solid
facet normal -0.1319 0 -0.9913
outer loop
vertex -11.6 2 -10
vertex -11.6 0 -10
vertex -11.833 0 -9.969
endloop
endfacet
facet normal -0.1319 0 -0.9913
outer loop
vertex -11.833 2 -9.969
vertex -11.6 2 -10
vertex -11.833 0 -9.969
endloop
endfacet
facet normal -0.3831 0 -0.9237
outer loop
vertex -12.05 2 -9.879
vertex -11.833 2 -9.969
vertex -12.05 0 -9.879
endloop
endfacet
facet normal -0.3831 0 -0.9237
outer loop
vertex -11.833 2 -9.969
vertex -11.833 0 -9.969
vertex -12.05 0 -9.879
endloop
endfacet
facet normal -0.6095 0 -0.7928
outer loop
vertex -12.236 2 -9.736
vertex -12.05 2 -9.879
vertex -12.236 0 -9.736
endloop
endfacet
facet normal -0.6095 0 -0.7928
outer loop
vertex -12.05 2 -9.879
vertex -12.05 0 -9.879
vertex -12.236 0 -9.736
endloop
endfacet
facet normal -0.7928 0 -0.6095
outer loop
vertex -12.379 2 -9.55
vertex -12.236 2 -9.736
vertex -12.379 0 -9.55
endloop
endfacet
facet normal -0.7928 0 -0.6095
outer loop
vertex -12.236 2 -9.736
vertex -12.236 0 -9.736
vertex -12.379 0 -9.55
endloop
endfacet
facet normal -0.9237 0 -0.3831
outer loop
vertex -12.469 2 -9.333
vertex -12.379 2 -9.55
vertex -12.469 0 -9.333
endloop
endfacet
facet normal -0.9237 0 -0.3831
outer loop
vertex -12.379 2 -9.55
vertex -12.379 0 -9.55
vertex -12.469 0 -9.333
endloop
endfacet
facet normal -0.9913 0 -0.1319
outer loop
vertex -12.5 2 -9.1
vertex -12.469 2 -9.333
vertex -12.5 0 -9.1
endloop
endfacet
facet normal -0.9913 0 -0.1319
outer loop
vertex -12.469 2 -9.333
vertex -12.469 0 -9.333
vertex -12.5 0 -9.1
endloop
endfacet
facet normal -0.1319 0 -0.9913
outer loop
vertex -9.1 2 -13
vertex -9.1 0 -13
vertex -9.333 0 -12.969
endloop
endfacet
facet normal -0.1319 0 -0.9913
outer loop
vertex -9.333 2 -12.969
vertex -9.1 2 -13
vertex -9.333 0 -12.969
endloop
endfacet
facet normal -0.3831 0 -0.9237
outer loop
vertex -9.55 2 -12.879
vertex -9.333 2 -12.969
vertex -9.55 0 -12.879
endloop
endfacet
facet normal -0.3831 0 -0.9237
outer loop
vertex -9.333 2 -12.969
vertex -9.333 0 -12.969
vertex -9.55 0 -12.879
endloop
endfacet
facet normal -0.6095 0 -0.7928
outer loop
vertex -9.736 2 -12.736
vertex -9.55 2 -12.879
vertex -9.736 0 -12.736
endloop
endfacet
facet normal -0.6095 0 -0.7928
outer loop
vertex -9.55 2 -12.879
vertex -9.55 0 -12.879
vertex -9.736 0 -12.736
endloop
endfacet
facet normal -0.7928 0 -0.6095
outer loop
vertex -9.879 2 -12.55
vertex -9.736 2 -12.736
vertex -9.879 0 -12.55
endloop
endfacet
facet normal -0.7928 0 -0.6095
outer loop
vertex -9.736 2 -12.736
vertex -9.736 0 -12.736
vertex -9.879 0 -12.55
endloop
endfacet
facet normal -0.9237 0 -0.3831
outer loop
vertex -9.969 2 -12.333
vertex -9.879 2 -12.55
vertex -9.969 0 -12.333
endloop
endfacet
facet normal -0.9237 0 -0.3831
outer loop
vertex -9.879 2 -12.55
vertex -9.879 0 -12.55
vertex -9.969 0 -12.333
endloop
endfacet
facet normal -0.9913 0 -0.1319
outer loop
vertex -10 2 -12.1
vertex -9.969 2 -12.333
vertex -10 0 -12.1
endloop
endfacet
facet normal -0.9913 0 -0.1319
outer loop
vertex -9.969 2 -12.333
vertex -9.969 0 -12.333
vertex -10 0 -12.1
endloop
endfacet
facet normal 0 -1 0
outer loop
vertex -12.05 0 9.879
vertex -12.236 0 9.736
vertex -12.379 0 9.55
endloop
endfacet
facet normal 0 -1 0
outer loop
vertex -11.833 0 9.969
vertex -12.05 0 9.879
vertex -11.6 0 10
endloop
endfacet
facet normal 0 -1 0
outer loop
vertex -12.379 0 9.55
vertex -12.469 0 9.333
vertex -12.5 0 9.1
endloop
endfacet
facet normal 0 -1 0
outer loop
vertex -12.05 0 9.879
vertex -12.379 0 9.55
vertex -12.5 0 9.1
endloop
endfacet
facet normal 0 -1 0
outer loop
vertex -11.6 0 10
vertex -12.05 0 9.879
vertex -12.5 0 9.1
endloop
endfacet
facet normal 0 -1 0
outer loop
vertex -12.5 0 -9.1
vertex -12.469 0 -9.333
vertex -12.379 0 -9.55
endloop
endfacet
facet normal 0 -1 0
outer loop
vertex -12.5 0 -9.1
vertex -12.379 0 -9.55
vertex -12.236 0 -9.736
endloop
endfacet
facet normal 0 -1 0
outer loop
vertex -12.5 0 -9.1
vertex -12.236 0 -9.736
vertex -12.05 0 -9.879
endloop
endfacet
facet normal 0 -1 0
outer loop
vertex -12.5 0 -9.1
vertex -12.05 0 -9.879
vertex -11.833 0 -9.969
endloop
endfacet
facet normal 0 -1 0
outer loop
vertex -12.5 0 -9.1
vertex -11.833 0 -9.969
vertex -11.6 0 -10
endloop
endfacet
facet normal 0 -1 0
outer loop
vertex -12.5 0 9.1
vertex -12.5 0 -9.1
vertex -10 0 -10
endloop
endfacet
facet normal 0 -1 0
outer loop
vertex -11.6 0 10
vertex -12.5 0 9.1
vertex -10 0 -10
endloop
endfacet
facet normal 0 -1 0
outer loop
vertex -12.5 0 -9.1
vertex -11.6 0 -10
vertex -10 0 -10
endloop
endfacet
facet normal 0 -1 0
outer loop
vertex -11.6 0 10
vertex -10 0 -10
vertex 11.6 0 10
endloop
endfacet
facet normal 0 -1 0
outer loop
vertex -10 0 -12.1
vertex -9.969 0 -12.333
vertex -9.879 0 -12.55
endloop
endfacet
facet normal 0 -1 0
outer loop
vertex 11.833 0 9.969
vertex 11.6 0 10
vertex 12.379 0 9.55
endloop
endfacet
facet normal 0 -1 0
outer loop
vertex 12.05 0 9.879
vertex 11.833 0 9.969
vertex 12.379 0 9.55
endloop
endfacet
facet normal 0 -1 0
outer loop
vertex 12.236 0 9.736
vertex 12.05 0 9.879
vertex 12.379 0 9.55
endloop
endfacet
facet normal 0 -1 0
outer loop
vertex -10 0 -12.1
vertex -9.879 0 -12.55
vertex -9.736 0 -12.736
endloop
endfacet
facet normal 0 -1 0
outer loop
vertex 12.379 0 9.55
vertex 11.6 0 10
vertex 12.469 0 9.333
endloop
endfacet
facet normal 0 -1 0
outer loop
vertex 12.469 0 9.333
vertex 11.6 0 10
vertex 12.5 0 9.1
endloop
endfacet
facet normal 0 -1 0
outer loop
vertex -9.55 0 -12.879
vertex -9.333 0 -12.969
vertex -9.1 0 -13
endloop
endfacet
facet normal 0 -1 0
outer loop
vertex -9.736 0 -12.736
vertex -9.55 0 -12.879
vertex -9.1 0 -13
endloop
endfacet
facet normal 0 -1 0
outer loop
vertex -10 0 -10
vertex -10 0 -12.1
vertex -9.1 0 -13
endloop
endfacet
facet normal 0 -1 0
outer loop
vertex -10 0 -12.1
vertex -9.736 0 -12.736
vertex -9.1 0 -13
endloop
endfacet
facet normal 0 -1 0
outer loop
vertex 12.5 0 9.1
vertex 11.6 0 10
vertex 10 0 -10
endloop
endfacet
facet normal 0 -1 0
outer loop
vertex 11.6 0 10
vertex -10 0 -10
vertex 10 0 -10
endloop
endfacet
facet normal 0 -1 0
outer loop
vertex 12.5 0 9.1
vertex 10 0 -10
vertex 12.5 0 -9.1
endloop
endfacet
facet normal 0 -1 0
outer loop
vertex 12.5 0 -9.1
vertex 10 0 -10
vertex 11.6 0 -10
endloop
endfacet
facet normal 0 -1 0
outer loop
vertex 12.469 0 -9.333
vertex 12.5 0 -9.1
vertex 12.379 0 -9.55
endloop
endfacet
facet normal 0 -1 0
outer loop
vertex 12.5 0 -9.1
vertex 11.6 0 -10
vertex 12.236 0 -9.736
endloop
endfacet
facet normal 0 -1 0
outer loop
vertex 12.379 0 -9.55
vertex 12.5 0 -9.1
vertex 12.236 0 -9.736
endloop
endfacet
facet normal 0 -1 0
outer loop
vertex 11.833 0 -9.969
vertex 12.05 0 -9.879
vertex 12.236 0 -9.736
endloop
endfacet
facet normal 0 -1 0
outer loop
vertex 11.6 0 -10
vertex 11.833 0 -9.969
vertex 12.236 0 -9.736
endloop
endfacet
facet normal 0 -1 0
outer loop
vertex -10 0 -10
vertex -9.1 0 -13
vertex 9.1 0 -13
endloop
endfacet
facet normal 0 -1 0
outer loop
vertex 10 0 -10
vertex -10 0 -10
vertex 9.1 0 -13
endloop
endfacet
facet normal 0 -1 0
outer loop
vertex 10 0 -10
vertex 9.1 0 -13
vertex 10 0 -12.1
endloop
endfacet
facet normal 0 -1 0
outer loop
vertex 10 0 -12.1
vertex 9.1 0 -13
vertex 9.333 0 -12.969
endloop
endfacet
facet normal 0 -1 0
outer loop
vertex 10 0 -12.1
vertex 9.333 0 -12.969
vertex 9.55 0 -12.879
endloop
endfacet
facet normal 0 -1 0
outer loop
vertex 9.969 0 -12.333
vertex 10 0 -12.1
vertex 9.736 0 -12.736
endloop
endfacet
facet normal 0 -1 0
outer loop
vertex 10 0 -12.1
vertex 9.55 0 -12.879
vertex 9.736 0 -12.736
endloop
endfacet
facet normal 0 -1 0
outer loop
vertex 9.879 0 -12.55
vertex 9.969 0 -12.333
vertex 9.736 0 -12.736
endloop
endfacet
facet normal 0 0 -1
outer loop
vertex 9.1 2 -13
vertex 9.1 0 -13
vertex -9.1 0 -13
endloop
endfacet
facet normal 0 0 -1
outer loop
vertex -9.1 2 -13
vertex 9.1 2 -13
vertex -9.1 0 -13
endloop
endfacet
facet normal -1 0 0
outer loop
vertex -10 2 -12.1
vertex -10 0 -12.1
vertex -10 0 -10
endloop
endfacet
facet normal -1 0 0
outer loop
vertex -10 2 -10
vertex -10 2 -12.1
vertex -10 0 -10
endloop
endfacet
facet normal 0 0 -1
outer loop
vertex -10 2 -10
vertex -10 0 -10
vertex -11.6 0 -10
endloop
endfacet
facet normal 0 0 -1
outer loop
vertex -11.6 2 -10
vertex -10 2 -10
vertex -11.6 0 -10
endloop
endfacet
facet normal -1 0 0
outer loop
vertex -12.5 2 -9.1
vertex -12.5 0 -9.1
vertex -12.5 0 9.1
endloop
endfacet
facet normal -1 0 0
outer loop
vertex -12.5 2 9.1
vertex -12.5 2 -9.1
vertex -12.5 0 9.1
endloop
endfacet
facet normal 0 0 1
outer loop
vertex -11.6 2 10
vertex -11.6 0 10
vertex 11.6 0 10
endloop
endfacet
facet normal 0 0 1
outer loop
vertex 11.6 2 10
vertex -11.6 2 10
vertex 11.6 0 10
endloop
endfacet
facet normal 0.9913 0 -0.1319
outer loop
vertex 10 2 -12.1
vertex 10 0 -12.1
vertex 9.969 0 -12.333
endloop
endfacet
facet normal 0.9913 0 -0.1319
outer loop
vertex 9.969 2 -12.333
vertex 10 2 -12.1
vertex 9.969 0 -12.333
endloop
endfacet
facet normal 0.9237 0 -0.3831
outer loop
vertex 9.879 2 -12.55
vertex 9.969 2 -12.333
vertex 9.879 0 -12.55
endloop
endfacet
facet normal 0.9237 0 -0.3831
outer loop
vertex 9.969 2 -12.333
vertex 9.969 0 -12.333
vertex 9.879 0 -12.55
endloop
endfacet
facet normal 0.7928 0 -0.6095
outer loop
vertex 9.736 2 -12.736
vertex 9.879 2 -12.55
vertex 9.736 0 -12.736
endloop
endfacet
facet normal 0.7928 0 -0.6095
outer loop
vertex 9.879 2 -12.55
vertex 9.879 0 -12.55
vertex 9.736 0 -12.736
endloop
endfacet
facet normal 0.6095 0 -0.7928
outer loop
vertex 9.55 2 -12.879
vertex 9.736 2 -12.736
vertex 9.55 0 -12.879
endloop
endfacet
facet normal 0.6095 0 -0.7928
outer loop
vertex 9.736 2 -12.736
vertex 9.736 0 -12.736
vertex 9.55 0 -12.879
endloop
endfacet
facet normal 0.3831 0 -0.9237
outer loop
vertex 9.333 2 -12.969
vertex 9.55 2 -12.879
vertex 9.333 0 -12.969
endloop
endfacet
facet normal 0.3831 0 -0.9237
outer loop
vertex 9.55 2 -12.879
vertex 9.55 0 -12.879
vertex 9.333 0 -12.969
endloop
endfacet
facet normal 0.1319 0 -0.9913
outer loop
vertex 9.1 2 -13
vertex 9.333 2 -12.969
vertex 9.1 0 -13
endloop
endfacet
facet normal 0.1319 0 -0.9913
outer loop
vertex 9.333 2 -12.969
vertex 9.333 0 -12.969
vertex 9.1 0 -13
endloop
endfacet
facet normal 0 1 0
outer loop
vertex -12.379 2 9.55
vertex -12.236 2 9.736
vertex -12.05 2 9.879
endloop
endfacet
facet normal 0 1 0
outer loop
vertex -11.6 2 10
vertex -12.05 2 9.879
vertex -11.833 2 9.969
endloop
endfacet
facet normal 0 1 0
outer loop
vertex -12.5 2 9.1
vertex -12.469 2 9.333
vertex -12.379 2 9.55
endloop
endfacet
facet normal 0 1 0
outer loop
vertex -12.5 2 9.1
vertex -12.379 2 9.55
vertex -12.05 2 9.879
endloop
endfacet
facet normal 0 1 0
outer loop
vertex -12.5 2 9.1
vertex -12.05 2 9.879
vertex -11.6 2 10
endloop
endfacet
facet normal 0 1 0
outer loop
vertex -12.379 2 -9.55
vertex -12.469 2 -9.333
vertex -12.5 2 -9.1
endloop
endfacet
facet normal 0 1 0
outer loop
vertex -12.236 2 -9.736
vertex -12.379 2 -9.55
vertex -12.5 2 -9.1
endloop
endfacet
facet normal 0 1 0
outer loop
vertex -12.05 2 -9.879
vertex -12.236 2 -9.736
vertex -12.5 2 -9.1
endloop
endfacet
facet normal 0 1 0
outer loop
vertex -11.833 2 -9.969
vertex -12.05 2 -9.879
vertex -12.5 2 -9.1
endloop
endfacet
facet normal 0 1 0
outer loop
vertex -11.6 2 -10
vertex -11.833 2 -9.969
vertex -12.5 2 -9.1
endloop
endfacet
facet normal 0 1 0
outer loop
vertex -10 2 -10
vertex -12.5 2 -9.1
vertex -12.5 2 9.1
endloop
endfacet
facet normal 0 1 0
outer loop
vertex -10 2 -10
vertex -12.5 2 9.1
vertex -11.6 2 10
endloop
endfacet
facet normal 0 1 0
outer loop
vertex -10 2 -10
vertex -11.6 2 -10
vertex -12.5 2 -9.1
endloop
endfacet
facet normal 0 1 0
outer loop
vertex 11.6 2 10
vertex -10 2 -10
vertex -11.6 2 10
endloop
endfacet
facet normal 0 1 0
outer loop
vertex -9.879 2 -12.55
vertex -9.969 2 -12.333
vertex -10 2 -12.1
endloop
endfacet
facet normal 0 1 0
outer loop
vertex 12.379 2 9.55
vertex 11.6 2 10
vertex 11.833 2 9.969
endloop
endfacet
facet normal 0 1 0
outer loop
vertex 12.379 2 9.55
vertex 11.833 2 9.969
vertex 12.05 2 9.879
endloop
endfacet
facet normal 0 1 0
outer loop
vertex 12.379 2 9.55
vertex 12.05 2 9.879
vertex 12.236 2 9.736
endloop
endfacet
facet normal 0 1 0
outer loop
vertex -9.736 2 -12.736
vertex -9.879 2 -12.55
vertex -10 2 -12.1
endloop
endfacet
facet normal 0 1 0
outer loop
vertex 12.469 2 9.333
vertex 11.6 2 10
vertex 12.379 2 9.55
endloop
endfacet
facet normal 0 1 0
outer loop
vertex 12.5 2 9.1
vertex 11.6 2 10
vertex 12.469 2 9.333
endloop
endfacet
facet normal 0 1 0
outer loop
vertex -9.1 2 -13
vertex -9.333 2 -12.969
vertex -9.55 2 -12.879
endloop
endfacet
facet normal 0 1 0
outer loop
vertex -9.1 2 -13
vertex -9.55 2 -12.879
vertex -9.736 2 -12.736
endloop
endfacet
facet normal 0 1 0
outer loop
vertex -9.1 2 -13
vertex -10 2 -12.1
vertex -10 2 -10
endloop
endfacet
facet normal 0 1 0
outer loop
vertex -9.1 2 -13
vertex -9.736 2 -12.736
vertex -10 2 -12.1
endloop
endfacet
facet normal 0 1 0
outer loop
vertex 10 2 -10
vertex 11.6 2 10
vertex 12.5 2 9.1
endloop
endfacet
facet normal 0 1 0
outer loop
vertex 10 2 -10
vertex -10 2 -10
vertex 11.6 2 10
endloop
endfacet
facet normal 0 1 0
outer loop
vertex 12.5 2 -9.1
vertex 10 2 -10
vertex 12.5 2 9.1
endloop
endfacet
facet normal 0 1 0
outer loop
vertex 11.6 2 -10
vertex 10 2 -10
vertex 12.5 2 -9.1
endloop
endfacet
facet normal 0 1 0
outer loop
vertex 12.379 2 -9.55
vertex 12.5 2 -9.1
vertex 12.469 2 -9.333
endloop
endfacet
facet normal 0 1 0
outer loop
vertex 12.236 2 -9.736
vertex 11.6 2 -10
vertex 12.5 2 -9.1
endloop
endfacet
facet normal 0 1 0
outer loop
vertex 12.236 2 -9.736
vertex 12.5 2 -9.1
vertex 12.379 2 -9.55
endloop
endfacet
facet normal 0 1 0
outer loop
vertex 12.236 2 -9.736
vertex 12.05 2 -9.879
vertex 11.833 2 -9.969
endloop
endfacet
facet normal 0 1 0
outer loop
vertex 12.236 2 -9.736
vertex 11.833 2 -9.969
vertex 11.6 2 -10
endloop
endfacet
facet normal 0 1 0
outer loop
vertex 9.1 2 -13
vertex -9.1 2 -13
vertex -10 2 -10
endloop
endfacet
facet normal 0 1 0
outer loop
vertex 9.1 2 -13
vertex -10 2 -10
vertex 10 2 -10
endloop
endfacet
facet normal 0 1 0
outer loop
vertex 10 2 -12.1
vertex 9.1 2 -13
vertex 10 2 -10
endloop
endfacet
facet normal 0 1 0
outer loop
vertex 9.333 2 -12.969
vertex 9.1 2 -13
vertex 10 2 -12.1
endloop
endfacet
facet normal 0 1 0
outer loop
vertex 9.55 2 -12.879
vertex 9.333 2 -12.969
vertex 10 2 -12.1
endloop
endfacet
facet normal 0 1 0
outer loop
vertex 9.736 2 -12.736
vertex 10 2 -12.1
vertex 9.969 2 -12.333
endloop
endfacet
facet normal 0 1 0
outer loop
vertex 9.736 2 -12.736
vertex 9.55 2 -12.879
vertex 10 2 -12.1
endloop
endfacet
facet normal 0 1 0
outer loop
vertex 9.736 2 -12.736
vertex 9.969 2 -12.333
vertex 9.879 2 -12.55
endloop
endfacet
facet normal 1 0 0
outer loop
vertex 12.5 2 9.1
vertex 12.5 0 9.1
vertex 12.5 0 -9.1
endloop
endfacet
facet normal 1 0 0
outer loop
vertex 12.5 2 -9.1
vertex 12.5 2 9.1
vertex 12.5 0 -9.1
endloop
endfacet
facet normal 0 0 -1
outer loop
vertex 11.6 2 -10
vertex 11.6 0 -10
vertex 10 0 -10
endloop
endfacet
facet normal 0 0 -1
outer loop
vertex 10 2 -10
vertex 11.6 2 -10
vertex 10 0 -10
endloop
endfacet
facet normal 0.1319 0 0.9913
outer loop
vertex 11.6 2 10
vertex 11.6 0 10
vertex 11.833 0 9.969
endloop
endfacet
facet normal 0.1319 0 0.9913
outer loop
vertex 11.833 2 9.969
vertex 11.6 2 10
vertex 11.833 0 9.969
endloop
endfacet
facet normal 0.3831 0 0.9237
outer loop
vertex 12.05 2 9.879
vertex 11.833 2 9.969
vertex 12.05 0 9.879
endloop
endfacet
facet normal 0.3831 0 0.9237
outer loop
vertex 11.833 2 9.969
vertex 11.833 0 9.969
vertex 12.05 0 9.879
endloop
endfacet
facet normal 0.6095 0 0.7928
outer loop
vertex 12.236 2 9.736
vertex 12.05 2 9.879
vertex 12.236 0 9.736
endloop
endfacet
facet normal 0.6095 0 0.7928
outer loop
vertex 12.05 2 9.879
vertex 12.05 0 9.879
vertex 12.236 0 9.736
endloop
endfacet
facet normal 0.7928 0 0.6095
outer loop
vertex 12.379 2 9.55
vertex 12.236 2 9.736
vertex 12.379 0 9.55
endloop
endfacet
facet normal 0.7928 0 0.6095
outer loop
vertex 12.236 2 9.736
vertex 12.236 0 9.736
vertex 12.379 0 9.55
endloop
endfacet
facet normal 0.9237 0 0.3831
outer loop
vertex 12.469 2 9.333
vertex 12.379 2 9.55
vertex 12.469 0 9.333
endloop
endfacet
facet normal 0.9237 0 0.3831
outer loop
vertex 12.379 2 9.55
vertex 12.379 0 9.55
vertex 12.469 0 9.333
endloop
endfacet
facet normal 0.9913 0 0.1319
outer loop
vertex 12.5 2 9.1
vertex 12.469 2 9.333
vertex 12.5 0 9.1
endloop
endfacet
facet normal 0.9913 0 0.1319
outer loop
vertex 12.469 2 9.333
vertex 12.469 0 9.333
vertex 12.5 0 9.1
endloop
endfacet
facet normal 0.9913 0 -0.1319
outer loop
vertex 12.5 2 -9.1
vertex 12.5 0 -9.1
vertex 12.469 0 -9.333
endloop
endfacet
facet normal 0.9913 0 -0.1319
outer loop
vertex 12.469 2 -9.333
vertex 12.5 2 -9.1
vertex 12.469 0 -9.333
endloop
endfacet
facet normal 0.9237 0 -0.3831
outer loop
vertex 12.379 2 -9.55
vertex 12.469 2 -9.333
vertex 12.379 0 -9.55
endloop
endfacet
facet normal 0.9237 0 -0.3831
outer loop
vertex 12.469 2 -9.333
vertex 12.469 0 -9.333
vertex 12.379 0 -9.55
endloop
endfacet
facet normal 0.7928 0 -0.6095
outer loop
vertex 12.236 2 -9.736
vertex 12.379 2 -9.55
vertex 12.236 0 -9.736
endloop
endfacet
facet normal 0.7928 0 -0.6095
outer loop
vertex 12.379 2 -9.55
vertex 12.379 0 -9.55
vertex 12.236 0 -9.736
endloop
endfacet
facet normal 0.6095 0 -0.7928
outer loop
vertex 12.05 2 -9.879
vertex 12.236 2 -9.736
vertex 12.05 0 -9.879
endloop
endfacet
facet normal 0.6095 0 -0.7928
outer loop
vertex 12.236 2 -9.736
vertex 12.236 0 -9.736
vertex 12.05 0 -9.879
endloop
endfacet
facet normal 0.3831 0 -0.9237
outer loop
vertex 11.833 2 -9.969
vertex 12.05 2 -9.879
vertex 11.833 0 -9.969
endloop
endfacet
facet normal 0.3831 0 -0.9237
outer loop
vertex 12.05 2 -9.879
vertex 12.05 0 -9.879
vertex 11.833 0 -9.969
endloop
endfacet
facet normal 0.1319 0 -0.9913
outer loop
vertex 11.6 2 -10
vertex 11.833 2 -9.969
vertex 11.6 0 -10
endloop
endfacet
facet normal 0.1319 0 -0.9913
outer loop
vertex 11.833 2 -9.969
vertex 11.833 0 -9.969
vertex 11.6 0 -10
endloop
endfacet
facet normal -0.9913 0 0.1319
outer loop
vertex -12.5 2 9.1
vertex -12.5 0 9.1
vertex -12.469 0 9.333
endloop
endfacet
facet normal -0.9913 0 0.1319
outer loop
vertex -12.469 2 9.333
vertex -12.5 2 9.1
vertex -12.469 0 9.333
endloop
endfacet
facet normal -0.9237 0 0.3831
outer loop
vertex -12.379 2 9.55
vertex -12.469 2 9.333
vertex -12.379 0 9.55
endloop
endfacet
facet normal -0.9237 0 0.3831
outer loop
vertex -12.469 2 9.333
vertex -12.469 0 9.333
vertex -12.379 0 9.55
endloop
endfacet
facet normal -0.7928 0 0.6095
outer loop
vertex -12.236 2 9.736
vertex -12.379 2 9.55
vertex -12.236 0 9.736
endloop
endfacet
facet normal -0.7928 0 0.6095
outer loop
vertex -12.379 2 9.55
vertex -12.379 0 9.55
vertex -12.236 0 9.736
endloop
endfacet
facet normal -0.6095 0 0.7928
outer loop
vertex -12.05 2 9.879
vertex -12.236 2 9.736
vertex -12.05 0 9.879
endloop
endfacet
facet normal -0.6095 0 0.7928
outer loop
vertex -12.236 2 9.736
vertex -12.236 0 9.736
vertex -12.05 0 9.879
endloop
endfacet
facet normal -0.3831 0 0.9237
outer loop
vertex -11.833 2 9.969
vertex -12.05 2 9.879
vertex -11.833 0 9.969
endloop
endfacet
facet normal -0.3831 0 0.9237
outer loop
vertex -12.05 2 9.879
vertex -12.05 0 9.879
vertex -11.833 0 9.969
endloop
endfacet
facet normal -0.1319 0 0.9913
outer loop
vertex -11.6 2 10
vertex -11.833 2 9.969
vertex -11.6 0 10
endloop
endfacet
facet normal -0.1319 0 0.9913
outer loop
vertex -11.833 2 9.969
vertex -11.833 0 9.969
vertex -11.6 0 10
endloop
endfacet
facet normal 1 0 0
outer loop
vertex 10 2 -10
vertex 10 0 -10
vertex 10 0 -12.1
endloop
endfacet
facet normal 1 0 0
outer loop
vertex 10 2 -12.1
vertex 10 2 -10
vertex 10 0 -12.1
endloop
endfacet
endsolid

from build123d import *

# Parameters (mm, degrees)
ESBO_O1_W                = 20
ESBO_O1_H                = 3
RESSALTO_EXTRUS_O1_DEPTH = 2


with BuildPart() as part:
    # Esboço1 → Ressalto-extrusão1 (new body)
    with BuildSketch(Plane(origin=(0, 0, 0), x_dir=(1, 0, 0), z_dir=(0, 1, 0))):
        with BuildLine():
            Line((-10, 10), (-11.599758025, 10))
            ThreePointArc((-11.599758025, 10), (-12.23632523, 9.73632523), (-12.5, 9.099758025))
            Line((-12.5, 9.099758025), (-12.5, -9.099758025))
            ThreePointArc((-12.5, -9.099758025), (-12.23632523, -9.73632523), (-11.599758025, -10))
            Line((-11.599758025, -10), (11.599758025, -10))
            ThreePointArc((11.599758025, -10), (12.23632523, -9.73632523), (12.5, -9.099758025))
            Line((12.5, -9.099758025), (12.5, 9.099758025))
            ThreePointArc((12.5, 9.099758025), (12.23632523, 9.73632523), (11.599758025, 10))
            Line((11.599758025, 10), (10, 10))
            Line((10, 10), (10, 7))
            Line((10, 7), (-10, 7))
            Line((-10, 7), (-10, 10))
        make_face()
        with BuildLine():
            Line((-10, 12.099758025), (-10, 10))
            Line((-10, 10), (10, 10))
            Line((10, 10), (10, 12.099758025))
            ThreePointArc((10, 12.099758025), (9.73632523, 12.73632523), (9.099758025, 13))
            Line((9.099758025, 13), (-9.099758025, 13))
            ThreePointArc((-9.099758025, 13), (-9.73632523, 12.73632523), (-10, 12.099758025))
        make_face()
        with Locations((0, 8.5)):
            Rectangle(ESBO_O1_W, ESBO_O1_H)
    extrude(amount=RESSALTO_EXTRUS_O1_DEPTH)


solid = part.part
